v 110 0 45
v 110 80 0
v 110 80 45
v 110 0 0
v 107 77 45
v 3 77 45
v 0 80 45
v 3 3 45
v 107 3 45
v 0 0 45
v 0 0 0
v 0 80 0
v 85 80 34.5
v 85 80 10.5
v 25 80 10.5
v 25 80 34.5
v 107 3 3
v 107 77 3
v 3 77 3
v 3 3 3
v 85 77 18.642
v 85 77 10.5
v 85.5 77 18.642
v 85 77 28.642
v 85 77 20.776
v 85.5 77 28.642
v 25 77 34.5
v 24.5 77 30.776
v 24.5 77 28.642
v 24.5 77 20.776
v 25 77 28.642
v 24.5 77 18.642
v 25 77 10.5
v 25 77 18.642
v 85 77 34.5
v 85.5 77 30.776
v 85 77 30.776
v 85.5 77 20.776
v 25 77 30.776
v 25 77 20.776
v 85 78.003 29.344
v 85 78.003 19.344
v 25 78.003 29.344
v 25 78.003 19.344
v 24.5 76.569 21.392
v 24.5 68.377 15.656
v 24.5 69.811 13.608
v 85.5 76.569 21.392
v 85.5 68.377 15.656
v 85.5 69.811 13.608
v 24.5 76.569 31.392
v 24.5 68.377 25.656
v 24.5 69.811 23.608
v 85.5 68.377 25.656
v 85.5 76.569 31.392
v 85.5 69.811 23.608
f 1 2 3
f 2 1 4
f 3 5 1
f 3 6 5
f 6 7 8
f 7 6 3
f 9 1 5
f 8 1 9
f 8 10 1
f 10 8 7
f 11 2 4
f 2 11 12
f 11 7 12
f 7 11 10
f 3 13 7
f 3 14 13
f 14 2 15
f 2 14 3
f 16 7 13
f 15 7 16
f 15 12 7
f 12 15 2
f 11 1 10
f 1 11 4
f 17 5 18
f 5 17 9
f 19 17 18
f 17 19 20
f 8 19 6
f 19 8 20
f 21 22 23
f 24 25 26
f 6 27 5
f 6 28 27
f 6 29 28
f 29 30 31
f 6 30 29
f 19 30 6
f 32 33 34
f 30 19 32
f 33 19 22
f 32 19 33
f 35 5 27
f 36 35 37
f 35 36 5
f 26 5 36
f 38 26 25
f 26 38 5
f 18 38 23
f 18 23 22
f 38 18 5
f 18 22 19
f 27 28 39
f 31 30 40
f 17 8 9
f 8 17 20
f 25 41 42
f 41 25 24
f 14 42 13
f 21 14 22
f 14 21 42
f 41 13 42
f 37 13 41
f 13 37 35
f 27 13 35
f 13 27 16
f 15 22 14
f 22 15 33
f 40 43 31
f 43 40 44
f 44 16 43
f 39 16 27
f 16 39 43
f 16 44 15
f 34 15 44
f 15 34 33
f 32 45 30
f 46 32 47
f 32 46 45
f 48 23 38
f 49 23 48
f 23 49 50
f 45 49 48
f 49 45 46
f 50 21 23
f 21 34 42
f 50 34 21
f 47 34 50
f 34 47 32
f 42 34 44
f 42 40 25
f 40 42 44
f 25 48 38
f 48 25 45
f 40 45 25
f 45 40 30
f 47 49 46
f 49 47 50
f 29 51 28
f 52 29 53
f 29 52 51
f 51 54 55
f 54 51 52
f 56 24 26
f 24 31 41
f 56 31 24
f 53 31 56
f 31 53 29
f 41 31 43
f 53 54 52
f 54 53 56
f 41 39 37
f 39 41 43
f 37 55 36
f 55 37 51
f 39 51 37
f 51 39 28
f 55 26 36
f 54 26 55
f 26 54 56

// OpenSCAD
$fn = 32;

// ----------------------------------------------------------------------
// Vent box: louvers enclosure
// ----------------------------------------------------------------------

// --- parameters (mm) ---
box_l = 110;              // box length, X
box_w = 80;               // box width, Y
box_h = 45;               // box height, Z
wall_t = 3;               // shell wall thickness
win_l = 60;               // vent window width, X
win_h = 24;               // vent window height, Z
slat_t = 2.5;             // louver slat thickness
slat_d = 10;              // louver slat depth
slat_a = 35;              // louver slat angle, degrees
slat_pitch = 10;          // louver pitch
slat_yc = 73.19;          // slat centreline Y

win_z0 = (box_h - win_h) / 2;  // window lower edge Z
n_slats = 2;  // louver count
slat_z0 = win_z0 + (win_h - (n_slats - 1) * slat_pitch) / 2;

difference() {
  union() {
    difference() {
      cube([box_l, box_w, box_h]);
  translate([wall_t, wall_t, wall_t])
    cube([box_l - 2 * wall_t, box_w - 2 * wall_t, box_h]);
  translate([(box_l - win_l) / 2, box_w - wall_t - 1, win_z0])
    cube([win_l, wall_t + 2, win_h]);
    }
    for (i = [0 : n_slats - 1])
      translate([box_l / 2, slat_yc, slat_z0 + i * slat_pitch])
        rotate([slat_a, 0, 0])
          cube([win_l + 1, slat_d, slat_t], center = true);
  }
}
